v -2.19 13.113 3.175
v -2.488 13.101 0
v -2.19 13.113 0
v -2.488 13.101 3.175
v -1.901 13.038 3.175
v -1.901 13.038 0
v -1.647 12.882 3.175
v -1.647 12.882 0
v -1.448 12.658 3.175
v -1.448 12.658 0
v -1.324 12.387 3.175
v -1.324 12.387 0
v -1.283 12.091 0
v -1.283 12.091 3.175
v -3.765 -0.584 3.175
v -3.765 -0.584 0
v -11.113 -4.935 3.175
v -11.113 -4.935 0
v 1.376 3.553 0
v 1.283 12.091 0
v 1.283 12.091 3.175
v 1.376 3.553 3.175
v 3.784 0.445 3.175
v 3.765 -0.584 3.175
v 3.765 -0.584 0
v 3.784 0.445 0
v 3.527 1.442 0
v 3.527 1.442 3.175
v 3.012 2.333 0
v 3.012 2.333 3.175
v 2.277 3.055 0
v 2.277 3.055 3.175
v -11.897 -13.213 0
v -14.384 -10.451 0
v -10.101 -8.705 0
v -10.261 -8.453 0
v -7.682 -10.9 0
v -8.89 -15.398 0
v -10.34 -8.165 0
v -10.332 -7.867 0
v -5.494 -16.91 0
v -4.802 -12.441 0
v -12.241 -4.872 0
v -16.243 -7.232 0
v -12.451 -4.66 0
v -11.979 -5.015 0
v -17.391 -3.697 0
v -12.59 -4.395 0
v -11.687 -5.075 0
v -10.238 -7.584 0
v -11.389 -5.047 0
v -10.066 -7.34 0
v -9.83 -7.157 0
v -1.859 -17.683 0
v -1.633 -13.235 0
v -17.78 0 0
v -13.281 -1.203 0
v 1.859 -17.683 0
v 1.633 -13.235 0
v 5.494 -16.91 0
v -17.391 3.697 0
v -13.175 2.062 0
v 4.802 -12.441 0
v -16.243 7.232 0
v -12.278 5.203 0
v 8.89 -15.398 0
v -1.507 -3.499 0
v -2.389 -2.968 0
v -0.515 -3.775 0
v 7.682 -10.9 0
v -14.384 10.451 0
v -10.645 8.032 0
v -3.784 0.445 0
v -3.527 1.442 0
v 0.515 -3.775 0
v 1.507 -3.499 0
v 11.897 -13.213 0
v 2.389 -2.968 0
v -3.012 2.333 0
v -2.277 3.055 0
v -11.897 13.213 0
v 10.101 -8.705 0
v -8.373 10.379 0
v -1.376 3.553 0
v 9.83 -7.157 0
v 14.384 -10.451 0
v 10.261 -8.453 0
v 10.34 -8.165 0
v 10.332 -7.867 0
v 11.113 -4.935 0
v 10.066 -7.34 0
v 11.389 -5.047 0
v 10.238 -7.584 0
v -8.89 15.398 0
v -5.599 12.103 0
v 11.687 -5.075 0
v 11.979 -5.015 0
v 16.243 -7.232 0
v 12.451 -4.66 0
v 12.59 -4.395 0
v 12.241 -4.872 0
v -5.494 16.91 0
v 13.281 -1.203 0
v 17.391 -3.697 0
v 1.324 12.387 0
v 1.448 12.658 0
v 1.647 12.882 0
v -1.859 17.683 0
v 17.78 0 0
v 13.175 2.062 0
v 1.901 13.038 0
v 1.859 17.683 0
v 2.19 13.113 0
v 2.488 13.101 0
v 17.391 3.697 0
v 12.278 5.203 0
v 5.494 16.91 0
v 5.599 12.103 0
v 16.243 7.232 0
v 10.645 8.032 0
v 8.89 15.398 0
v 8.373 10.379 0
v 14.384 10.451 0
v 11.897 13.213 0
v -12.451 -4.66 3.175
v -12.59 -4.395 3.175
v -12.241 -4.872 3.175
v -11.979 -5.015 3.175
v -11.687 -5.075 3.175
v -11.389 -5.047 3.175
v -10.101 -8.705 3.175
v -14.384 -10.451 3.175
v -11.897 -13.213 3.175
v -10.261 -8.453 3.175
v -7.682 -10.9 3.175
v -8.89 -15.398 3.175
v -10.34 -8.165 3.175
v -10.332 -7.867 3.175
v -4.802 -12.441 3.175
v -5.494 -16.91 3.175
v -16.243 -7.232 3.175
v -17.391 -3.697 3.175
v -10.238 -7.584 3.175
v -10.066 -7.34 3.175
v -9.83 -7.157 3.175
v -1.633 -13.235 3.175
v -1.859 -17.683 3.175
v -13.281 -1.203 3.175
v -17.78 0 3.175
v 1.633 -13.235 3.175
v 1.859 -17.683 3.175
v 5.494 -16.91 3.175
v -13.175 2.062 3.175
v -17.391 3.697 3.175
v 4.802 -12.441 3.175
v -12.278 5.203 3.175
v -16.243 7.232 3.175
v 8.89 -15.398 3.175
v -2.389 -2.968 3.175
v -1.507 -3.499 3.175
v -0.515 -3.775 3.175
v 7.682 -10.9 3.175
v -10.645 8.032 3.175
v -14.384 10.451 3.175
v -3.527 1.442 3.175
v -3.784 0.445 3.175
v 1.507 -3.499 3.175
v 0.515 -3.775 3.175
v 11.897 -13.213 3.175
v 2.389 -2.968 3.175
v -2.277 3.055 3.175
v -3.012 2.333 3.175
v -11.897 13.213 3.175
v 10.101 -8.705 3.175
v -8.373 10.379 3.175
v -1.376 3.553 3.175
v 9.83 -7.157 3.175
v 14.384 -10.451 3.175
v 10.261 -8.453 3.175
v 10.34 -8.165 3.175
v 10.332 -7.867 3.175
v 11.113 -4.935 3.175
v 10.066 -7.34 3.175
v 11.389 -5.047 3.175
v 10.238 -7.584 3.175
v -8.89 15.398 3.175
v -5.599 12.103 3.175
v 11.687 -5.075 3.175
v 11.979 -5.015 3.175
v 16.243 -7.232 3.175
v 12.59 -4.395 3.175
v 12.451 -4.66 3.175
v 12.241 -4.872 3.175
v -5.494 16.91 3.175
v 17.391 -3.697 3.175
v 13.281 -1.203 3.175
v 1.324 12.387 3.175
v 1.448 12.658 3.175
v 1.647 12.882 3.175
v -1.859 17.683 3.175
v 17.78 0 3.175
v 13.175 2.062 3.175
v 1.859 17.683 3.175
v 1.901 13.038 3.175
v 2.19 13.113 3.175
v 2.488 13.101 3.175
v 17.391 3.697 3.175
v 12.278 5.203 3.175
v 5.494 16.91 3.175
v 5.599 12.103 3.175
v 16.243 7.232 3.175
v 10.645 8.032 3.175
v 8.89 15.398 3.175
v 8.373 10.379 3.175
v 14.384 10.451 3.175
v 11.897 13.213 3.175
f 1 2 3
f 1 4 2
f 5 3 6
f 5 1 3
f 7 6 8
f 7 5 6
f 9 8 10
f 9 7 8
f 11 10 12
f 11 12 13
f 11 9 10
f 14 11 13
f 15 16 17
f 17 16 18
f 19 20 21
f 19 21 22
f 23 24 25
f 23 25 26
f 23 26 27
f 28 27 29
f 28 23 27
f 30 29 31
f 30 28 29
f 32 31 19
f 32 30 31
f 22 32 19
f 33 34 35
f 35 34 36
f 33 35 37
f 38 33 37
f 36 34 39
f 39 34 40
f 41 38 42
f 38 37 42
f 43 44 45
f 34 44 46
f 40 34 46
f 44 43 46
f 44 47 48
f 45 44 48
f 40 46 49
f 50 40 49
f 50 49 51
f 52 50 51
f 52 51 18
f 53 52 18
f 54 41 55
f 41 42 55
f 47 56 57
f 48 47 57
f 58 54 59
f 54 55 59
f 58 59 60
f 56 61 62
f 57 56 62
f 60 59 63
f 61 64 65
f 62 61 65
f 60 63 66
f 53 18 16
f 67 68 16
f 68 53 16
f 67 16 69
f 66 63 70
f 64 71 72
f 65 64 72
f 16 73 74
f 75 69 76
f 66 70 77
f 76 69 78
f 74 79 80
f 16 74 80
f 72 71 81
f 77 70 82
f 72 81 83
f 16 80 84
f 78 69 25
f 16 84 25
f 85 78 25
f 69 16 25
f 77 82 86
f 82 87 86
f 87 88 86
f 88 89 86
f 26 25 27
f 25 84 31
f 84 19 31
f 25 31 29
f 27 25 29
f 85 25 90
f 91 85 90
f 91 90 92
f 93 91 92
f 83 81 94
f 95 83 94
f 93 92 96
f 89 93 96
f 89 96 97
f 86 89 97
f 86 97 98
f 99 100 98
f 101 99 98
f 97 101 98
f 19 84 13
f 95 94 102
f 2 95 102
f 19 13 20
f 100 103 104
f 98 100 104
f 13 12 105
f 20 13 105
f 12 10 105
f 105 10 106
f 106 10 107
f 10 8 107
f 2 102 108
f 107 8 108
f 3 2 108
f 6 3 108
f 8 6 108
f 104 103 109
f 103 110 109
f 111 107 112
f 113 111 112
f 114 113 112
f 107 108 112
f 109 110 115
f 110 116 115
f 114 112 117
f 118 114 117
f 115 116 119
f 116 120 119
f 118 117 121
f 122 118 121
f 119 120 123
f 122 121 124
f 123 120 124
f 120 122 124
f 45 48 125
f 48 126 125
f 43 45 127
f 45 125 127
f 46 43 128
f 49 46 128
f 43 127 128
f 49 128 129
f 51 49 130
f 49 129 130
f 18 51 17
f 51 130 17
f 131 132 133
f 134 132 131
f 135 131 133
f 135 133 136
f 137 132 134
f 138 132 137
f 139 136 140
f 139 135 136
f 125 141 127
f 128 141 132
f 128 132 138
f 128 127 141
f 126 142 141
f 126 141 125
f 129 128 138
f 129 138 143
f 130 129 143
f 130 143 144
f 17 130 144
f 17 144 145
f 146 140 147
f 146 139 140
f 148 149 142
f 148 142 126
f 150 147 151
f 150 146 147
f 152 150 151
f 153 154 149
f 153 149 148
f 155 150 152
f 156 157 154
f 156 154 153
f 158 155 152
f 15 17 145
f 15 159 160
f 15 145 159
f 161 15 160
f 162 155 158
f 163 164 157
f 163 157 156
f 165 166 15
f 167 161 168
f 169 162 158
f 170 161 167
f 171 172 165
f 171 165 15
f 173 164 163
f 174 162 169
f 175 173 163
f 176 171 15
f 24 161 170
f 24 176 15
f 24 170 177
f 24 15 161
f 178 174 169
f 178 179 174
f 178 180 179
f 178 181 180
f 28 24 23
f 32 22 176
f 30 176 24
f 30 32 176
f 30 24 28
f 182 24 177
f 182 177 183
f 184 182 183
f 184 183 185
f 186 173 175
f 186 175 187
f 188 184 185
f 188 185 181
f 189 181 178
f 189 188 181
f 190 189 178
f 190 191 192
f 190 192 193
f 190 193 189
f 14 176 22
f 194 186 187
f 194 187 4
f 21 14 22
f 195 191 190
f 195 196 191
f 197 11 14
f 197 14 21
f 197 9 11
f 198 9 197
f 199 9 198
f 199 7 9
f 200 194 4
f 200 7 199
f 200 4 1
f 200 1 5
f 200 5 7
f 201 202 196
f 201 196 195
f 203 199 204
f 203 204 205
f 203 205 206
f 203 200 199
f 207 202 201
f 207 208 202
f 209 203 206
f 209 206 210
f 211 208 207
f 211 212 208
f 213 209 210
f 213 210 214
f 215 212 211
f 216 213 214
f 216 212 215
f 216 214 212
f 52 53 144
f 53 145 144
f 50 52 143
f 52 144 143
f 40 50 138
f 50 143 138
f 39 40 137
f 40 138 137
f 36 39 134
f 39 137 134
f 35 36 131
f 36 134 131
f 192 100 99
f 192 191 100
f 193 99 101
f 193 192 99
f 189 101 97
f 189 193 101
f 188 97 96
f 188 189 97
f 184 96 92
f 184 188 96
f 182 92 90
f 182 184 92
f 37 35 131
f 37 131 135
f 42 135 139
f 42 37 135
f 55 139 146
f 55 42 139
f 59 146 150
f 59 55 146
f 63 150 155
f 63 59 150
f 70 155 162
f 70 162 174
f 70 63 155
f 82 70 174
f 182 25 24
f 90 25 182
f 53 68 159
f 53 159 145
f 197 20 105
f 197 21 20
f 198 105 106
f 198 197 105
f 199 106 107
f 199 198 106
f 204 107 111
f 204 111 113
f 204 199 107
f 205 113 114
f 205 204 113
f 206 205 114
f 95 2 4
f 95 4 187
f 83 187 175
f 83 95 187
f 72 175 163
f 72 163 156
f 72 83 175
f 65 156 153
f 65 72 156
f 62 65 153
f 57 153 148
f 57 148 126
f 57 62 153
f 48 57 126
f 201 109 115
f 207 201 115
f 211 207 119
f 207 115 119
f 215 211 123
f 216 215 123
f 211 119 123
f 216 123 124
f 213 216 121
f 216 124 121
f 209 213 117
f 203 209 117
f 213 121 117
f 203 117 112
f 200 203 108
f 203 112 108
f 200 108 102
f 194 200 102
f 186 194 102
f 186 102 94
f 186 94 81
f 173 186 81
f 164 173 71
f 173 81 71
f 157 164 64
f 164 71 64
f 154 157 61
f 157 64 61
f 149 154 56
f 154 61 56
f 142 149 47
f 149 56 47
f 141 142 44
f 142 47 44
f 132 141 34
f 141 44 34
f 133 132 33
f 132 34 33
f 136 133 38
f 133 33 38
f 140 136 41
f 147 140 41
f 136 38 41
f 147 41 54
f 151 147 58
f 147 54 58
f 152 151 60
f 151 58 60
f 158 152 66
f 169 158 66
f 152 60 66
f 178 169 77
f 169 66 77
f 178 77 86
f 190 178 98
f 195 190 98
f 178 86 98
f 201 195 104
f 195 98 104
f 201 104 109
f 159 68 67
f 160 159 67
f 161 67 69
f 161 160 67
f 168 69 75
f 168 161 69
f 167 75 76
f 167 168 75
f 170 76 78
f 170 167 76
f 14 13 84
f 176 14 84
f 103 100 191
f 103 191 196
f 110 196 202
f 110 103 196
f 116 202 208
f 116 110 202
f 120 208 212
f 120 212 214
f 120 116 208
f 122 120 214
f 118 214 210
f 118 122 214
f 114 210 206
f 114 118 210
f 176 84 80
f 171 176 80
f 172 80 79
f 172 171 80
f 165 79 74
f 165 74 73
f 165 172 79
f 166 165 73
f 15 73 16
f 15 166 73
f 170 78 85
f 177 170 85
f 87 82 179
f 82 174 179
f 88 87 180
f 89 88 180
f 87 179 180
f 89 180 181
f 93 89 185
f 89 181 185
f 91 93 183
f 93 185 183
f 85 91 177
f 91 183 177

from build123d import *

# Parameters (mm, degrees)
SKETCH_R     = 17.78
PAD_DEPTH    = 3.175
FILLET_R     = 1.016
SKETCH001_R  = 3.81
PAD001_DEPTH = 3.175


with BuildPart() as part:
    # Sketch → Pad (new body)
    with BuildSketch(Plane.XY):
        Circle(SKETCH_R)
        with BuildLine():
            Line((-1.27, 13.274386), (-1.394671, 1.88415))
            ThreePointArc((-2.329057, 0.265745), (-1.649778, 0.9525), (-1.394671, 1.88415))
            Line((-2.329057, 0.265745), (-12.130956, -5.537341))
            ThreePointArc((-1.27, 13.274386), (-11.548449, 6.6675), (-12.130956, -5.537341))
        make_face(mode=Mode.SUBTRACT)
        with BuildLine():
            Line((1.27, 13.274386), (1.394671, 1.88415))
            ThreePointArc((1.394671, 1.88415), (1.649778, 0.9525), (2.329057, 0.265745))
            Line((2.329057, 0.265745), (12.130956, -5.537341))
            ThreePointArc((12.130956, -5.537341), (11.548449, 6.6675), (1.27, 13.274386))
        make_face(mode=Mode.SUBTRACT)
        with BuildLine():
            Line((-0.934387, -2.149896), (-10.860956, -7.737045))
            ThreePointArc((-10.860956, -7.737045), (0, -13.335), (10.860956, -7.737045))
            Line((0.934387, -2.149896), (10.860956, -7.737045))
            ThreePointArc((0.934387, -2.149896), (0, -1.905), (-0.934387, -2.149896))
        make_face(mode=Mode.SUBTRACT)
    extrude(amount=PAD_DEPTH)

    # Fillet
    fillet_edges = [part.edges().sort_by_distance(p)[0] for p in [
        (-12.130956, -5.537341, 1.5875),
        (-1.27, 13.274386, 1.5875),
        (1.27, 13.274386, 1.5875),
        (-10.860956, -7.737045, 1.5875),
        (10.860956, -7.737045, 1.5875),
        (12.130956, -5.537341, 1.5875),
    ]]
    fillet(fillet_edges, radius=FILLET_R)

    # Sketch001 (on Face5 of Fillet) → Pad001 (join)
    with BuildSketch(Plane.XY.offset(3.175)):
        Circle(SKETCH001_R)
    extrude(amount=-PAD001_DEPTH)


solid = part.part
